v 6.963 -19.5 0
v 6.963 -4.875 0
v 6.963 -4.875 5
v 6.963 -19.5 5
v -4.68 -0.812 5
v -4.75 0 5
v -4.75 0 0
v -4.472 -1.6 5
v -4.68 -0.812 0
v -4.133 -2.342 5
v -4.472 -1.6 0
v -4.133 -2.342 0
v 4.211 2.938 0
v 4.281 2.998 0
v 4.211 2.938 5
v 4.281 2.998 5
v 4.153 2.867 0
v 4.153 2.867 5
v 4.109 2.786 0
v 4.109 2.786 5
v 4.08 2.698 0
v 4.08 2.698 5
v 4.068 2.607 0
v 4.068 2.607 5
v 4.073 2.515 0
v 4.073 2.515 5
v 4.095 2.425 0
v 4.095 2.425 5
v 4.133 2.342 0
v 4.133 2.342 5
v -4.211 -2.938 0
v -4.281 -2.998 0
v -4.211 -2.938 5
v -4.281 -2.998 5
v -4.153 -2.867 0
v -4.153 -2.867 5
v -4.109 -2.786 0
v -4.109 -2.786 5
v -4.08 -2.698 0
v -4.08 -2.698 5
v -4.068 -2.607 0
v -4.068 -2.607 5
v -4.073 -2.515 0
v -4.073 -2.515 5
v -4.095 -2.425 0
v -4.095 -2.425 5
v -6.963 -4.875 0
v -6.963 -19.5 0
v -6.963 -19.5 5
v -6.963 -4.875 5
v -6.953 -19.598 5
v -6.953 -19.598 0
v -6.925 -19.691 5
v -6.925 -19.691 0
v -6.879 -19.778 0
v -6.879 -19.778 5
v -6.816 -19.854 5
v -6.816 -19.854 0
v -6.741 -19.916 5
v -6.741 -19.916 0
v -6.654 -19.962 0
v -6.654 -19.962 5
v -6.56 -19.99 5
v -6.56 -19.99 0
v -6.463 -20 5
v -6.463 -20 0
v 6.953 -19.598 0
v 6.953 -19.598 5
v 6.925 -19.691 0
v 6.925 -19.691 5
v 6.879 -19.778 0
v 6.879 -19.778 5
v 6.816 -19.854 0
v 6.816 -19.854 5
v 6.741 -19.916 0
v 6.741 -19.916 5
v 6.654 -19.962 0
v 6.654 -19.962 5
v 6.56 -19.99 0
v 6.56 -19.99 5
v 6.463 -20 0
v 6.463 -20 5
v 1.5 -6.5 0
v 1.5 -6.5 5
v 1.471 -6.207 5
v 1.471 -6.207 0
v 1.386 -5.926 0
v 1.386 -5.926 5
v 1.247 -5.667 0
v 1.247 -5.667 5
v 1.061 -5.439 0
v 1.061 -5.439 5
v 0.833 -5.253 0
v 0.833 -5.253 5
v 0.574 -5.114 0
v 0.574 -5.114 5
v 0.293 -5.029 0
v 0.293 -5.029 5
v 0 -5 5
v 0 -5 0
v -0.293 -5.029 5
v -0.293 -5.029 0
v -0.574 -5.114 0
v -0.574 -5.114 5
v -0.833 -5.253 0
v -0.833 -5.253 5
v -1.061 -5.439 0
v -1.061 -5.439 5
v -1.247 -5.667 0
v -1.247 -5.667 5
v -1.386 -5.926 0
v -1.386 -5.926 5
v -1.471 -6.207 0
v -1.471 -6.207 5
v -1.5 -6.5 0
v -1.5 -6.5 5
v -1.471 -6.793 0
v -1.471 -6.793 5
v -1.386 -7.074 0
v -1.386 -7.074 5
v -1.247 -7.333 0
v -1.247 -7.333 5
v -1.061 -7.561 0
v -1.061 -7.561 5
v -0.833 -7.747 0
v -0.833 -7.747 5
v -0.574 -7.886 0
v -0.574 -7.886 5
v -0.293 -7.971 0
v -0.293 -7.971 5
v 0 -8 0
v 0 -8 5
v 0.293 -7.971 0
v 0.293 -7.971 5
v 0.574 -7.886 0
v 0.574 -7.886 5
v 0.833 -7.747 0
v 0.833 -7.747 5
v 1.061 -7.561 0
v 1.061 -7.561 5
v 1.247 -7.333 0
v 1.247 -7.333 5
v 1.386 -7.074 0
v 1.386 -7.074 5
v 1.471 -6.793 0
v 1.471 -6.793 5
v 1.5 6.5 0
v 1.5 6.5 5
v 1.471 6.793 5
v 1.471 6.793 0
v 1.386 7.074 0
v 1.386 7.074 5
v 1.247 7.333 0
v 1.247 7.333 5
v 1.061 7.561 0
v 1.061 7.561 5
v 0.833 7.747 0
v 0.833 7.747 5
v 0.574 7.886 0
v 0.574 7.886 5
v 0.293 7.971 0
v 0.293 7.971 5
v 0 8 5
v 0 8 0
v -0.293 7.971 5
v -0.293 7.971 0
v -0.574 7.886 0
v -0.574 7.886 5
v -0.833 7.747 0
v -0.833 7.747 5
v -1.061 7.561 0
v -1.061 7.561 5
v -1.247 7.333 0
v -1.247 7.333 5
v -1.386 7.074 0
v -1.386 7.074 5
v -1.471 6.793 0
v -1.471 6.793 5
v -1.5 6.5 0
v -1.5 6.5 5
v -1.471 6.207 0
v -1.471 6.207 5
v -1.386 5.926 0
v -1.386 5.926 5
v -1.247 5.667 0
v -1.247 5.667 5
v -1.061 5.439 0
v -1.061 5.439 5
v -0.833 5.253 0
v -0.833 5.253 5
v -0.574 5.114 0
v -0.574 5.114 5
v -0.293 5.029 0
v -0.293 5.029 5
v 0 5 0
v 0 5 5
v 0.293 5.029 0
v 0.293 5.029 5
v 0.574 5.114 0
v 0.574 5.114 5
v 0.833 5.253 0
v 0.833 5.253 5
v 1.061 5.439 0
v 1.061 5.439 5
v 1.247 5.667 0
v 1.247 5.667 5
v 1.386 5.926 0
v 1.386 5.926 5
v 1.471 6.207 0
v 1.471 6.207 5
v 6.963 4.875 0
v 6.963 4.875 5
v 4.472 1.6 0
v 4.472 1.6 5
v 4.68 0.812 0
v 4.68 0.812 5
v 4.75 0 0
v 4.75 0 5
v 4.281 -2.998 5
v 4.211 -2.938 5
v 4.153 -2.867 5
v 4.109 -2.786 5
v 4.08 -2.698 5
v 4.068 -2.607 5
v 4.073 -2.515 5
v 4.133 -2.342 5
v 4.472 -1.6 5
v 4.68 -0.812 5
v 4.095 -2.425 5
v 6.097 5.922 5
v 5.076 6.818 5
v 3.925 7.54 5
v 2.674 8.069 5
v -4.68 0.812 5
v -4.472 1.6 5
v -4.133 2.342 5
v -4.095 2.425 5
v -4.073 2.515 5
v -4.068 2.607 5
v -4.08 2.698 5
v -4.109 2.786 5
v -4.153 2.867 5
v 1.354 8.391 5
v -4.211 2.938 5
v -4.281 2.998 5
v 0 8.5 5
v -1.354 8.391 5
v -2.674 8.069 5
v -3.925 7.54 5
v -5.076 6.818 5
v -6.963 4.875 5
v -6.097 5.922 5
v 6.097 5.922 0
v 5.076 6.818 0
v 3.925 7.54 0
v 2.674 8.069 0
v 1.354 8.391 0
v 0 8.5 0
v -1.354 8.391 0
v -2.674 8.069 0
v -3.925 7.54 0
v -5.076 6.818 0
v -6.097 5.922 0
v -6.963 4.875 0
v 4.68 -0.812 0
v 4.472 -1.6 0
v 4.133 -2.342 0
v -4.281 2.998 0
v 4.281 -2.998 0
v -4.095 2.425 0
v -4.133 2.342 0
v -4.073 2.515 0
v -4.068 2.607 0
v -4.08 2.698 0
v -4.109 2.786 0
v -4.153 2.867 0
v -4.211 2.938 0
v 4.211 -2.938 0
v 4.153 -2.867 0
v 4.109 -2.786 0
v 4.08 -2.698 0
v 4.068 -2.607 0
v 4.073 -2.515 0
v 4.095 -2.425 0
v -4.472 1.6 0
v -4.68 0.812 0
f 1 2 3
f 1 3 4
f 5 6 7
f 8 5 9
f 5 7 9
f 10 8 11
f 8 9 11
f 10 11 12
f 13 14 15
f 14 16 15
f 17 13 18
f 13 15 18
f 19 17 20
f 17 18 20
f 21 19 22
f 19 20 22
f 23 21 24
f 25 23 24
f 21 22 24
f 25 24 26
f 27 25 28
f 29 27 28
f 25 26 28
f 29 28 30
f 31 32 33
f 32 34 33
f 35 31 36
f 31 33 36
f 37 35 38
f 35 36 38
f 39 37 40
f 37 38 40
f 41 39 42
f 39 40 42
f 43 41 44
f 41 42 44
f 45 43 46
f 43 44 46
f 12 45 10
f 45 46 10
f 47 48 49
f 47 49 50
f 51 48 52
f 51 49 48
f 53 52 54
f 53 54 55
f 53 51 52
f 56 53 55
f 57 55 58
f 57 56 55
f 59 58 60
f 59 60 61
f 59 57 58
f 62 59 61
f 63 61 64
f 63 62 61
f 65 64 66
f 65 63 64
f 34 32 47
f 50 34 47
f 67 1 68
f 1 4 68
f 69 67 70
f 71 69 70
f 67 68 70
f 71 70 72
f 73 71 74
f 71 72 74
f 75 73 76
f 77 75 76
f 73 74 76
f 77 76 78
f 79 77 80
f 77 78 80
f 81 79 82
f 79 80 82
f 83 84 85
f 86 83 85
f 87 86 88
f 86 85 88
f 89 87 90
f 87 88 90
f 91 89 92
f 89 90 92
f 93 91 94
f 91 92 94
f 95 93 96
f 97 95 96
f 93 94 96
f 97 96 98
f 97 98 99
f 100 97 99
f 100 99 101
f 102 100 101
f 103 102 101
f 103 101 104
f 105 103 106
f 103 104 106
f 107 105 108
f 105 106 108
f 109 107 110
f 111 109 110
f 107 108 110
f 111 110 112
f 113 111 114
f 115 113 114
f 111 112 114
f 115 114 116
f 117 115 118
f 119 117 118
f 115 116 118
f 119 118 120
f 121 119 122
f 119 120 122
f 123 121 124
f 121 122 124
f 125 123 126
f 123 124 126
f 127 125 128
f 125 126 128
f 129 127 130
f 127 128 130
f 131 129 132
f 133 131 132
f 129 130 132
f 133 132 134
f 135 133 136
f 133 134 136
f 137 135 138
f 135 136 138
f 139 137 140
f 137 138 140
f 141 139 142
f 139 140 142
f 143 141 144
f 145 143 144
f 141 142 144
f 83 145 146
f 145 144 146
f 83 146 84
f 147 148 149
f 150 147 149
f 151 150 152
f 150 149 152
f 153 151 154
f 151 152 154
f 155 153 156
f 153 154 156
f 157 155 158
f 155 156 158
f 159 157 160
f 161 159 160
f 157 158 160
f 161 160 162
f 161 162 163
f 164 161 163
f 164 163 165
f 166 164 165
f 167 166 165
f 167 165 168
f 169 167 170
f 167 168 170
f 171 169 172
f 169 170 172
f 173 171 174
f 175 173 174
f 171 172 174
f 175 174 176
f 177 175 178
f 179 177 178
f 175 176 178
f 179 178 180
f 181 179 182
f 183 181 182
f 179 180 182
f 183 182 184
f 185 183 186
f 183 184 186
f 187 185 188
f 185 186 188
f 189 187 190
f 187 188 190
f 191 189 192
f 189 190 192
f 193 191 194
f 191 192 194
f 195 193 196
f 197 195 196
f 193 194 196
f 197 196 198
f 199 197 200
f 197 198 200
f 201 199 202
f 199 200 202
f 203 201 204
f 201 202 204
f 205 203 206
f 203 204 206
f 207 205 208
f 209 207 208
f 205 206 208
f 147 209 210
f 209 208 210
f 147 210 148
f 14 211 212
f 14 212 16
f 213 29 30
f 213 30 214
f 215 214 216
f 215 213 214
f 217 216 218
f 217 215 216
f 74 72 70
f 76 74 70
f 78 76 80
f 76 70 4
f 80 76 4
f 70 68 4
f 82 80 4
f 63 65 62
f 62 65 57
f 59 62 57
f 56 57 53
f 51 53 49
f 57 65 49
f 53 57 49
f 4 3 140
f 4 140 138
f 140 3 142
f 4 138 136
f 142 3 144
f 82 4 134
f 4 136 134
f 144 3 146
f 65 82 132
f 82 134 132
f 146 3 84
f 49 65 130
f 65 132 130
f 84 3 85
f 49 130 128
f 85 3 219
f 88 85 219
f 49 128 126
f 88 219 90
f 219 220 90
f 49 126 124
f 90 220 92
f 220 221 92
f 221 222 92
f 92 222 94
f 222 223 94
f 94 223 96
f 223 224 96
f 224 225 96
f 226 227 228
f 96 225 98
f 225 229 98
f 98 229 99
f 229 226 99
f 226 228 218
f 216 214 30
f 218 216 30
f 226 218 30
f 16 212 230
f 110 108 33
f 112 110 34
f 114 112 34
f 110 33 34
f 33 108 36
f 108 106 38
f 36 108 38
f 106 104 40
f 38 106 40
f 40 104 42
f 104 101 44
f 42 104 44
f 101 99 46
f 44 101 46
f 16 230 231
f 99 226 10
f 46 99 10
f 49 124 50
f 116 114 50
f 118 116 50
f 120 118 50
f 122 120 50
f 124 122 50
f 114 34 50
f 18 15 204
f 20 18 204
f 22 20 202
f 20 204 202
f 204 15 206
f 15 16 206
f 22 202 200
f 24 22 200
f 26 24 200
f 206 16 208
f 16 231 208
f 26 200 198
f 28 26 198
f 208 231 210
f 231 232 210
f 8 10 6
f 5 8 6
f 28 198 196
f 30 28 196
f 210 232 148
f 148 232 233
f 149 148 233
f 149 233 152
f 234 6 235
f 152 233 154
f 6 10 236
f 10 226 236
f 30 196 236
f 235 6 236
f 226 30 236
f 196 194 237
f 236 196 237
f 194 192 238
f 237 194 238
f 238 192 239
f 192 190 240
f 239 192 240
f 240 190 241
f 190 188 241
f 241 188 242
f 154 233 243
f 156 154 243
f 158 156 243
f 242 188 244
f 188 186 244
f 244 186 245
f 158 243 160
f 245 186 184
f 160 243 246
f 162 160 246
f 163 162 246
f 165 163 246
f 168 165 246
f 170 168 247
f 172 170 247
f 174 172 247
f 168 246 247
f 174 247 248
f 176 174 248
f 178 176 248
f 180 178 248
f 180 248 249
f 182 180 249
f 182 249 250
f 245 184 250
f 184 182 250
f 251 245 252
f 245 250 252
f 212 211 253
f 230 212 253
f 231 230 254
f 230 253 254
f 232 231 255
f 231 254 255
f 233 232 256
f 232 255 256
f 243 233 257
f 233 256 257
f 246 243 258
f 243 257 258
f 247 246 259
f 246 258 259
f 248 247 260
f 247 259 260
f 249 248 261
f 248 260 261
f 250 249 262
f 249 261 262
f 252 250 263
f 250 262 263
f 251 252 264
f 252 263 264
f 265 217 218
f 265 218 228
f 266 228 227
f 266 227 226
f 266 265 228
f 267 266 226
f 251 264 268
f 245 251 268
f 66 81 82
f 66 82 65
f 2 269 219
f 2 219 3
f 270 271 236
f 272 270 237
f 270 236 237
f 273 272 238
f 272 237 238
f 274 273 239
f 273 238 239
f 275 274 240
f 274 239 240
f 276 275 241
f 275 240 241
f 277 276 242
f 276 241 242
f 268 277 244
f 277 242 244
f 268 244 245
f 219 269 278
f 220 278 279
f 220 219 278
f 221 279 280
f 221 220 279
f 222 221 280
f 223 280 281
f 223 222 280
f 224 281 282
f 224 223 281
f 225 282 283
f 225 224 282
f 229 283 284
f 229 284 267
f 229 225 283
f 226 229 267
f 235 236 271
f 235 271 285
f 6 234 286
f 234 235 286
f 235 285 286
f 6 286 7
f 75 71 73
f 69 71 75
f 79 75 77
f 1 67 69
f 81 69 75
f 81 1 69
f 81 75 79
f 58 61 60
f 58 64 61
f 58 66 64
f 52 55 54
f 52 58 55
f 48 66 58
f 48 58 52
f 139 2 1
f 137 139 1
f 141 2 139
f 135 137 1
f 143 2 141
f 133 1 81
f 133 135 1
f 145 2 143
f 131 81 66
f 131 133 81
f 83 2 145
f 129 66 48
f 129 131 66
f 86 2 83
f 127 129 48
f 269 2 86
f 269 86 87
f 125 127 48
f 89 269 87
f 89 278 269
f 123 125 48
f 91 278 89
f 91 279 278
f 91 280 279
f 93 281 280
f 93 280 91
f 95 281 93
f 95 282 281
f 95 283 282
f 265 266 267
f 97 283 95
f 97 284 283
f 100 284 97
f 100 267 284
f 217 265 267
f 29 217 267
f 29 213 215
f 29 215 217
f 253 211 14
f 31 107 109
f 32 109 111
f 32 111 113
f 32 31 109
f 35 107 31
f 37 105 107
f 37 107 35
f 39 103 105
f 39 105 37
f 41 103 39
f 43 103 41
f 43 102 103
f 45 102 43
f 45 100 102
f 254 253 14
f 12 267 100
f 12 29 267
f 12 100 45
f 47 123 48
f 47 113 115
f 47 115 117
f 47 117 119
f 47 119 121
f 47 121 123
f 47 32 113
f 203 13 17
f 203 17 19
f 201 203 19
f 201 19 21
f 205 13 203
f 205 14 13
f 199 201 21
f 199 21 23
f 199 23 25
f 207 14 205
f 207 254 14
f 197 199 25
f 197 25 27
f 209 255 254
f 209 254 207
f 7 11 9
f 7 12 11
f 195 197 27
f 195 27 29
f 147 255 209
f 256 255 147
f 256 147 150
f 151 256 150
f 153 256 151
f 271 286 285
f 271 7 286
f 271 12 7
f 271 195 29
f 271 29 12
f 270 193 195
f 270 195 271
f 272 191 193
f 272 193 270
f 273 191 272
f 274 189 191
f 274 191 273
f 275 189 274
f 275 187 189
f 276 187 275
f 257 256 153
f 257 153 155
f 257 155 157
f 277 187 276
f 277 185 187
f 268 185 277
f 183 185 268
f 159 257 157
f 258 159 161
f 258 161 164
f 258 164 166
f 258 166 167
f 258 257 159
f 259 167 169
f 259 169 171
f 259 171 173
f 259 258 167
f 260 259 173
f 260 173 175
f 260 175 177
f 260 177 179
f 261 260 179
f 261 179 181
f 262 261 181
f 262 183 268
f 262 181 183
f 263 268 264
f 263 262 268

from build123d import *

# Parameters (mm, degrees)
SKETCH_1_R          = 8.5
EXTRUDE_1_DEPTH     = 5
SKETCH_2_R          = 1.5
CUT_EXTRUDE_1_DEPTH = 5
CUT_EXTRUDE_2_DEPTH = 6
EXTRUDE_2_DEPTH     = 5
FILLET_1_R          = 0.5
FILLET_2_R          = 0.5


with BuildPart() as part:
    # 草图1 → 凸台-拉伸1 (new body)
    with BuildSketch(Plane.XY):
        Circle(SKETCH_1_R)
    extrude(amount=EXTRUDE_1_DEPTH)

    # 草图2 → 切除-拉伸1 (cut)
    with BuildSketch(Plane.XY.offset(5)):
        with Locations((0, 6.5)):
            Circle(SKETCH_2_R)
        with Locations((0, -6.5)):
            Circle(SKETCH_2_R)
    extrude(amount=-CUT_EXTRUDE_1_DEPTH, mode=Mode.SUBTRACT)

    # 草图3 → 切除-拉伸2 (cut, through all)
    with BuildSketch(Plane(origin=(0, 0, 0), x_dir=(-1, 0, 0), z_dir=(0, 0, -1))):
        with BuildLine():
            Line((6.962792376, 4.875399709), (3.89097221, 2.724488073))
            ThreePointArc((3.89097221, 2.724488073), (4.530155516, 1.428352548), (4.75, 0))
            ThreePointArc((4.75, 0), (4.530155516, -1.428352548), (3.89097221, -2.724488073))
            Line((3.89097221, -2.724488073), (6.962792376, -4.875399709))
            ThreePointArc((6.962792376, -4.875399709), (8.106594081, -2.555999296), (8.5, 0))
            ThreePointArc((8.5, 0), (8.106594081, 2.555999296), (6.962792376, 4.875399709))
        make_face()
    cut_extrude_2 = extrude(amount=-CUT_EXTRUDE_2_DEPTH, mode=Mode.SUBTRACT)

    # 镜向1: 切除-拉伸2 across plane
    add(cut_extrude_2.mirror(Plane(origin=(0, 0, 0), x_dir=(0, 0, 1), z_dir=(1, 0, 0))), mode=Mode.SUBTRACT)


with BuildPart() as body_2:
    # 草图4 → 凸台-拉伸2 (new body)
    with BuildSketch(Plane(origin=(0, 0, 0), x_dir=(-1, 0, 0), z_dir=(0, 0, -1))):
        with BuildLine():
            ThreePointArc((6.962792376, -4.875399709), (0, -8.5), (-6.962792376, -4.875399709))
            Line((-6.962792376, -4.875399709), (-6.962792376, -20))
            Line((-6.962792376, -20), (6.962792376, -20))
            Line((6.962792376, -20), (6.962792376, -4.875399709))
        make_face()
    extrude(amount=-EXTRUDE_2_DEPTH)


with BuildPart() as part_1:
    add(part.part)

    # Combine 1: union body 2
    add(body_2.part)

    # 圆角1
    fillet_1_edges = [part_1.edges().sort_by_distance(p)[0] for p in [
        (-3.89097221, -2.724488073, 2.5),
        (-3.89097221, 2.724488073, 2.5),
        (3.89097221, 2.724488073, 2.5),
        (3.89097221, -2.724488073, 2.5),
    ]]
    fillet(fillet_1_edges, radius=FILLET_1_R)

    # 圆角2
    fillet_2_edges = [part_1.edges().sort_by_distance(p)[0] for p in [
        (-6.962792376, -20, 2.5),
        (6.962792376, -20, 2.5),
    ]]
    fillet(fillet_2_edges, radius=FILLET_2_R)


solid = part_1.part
